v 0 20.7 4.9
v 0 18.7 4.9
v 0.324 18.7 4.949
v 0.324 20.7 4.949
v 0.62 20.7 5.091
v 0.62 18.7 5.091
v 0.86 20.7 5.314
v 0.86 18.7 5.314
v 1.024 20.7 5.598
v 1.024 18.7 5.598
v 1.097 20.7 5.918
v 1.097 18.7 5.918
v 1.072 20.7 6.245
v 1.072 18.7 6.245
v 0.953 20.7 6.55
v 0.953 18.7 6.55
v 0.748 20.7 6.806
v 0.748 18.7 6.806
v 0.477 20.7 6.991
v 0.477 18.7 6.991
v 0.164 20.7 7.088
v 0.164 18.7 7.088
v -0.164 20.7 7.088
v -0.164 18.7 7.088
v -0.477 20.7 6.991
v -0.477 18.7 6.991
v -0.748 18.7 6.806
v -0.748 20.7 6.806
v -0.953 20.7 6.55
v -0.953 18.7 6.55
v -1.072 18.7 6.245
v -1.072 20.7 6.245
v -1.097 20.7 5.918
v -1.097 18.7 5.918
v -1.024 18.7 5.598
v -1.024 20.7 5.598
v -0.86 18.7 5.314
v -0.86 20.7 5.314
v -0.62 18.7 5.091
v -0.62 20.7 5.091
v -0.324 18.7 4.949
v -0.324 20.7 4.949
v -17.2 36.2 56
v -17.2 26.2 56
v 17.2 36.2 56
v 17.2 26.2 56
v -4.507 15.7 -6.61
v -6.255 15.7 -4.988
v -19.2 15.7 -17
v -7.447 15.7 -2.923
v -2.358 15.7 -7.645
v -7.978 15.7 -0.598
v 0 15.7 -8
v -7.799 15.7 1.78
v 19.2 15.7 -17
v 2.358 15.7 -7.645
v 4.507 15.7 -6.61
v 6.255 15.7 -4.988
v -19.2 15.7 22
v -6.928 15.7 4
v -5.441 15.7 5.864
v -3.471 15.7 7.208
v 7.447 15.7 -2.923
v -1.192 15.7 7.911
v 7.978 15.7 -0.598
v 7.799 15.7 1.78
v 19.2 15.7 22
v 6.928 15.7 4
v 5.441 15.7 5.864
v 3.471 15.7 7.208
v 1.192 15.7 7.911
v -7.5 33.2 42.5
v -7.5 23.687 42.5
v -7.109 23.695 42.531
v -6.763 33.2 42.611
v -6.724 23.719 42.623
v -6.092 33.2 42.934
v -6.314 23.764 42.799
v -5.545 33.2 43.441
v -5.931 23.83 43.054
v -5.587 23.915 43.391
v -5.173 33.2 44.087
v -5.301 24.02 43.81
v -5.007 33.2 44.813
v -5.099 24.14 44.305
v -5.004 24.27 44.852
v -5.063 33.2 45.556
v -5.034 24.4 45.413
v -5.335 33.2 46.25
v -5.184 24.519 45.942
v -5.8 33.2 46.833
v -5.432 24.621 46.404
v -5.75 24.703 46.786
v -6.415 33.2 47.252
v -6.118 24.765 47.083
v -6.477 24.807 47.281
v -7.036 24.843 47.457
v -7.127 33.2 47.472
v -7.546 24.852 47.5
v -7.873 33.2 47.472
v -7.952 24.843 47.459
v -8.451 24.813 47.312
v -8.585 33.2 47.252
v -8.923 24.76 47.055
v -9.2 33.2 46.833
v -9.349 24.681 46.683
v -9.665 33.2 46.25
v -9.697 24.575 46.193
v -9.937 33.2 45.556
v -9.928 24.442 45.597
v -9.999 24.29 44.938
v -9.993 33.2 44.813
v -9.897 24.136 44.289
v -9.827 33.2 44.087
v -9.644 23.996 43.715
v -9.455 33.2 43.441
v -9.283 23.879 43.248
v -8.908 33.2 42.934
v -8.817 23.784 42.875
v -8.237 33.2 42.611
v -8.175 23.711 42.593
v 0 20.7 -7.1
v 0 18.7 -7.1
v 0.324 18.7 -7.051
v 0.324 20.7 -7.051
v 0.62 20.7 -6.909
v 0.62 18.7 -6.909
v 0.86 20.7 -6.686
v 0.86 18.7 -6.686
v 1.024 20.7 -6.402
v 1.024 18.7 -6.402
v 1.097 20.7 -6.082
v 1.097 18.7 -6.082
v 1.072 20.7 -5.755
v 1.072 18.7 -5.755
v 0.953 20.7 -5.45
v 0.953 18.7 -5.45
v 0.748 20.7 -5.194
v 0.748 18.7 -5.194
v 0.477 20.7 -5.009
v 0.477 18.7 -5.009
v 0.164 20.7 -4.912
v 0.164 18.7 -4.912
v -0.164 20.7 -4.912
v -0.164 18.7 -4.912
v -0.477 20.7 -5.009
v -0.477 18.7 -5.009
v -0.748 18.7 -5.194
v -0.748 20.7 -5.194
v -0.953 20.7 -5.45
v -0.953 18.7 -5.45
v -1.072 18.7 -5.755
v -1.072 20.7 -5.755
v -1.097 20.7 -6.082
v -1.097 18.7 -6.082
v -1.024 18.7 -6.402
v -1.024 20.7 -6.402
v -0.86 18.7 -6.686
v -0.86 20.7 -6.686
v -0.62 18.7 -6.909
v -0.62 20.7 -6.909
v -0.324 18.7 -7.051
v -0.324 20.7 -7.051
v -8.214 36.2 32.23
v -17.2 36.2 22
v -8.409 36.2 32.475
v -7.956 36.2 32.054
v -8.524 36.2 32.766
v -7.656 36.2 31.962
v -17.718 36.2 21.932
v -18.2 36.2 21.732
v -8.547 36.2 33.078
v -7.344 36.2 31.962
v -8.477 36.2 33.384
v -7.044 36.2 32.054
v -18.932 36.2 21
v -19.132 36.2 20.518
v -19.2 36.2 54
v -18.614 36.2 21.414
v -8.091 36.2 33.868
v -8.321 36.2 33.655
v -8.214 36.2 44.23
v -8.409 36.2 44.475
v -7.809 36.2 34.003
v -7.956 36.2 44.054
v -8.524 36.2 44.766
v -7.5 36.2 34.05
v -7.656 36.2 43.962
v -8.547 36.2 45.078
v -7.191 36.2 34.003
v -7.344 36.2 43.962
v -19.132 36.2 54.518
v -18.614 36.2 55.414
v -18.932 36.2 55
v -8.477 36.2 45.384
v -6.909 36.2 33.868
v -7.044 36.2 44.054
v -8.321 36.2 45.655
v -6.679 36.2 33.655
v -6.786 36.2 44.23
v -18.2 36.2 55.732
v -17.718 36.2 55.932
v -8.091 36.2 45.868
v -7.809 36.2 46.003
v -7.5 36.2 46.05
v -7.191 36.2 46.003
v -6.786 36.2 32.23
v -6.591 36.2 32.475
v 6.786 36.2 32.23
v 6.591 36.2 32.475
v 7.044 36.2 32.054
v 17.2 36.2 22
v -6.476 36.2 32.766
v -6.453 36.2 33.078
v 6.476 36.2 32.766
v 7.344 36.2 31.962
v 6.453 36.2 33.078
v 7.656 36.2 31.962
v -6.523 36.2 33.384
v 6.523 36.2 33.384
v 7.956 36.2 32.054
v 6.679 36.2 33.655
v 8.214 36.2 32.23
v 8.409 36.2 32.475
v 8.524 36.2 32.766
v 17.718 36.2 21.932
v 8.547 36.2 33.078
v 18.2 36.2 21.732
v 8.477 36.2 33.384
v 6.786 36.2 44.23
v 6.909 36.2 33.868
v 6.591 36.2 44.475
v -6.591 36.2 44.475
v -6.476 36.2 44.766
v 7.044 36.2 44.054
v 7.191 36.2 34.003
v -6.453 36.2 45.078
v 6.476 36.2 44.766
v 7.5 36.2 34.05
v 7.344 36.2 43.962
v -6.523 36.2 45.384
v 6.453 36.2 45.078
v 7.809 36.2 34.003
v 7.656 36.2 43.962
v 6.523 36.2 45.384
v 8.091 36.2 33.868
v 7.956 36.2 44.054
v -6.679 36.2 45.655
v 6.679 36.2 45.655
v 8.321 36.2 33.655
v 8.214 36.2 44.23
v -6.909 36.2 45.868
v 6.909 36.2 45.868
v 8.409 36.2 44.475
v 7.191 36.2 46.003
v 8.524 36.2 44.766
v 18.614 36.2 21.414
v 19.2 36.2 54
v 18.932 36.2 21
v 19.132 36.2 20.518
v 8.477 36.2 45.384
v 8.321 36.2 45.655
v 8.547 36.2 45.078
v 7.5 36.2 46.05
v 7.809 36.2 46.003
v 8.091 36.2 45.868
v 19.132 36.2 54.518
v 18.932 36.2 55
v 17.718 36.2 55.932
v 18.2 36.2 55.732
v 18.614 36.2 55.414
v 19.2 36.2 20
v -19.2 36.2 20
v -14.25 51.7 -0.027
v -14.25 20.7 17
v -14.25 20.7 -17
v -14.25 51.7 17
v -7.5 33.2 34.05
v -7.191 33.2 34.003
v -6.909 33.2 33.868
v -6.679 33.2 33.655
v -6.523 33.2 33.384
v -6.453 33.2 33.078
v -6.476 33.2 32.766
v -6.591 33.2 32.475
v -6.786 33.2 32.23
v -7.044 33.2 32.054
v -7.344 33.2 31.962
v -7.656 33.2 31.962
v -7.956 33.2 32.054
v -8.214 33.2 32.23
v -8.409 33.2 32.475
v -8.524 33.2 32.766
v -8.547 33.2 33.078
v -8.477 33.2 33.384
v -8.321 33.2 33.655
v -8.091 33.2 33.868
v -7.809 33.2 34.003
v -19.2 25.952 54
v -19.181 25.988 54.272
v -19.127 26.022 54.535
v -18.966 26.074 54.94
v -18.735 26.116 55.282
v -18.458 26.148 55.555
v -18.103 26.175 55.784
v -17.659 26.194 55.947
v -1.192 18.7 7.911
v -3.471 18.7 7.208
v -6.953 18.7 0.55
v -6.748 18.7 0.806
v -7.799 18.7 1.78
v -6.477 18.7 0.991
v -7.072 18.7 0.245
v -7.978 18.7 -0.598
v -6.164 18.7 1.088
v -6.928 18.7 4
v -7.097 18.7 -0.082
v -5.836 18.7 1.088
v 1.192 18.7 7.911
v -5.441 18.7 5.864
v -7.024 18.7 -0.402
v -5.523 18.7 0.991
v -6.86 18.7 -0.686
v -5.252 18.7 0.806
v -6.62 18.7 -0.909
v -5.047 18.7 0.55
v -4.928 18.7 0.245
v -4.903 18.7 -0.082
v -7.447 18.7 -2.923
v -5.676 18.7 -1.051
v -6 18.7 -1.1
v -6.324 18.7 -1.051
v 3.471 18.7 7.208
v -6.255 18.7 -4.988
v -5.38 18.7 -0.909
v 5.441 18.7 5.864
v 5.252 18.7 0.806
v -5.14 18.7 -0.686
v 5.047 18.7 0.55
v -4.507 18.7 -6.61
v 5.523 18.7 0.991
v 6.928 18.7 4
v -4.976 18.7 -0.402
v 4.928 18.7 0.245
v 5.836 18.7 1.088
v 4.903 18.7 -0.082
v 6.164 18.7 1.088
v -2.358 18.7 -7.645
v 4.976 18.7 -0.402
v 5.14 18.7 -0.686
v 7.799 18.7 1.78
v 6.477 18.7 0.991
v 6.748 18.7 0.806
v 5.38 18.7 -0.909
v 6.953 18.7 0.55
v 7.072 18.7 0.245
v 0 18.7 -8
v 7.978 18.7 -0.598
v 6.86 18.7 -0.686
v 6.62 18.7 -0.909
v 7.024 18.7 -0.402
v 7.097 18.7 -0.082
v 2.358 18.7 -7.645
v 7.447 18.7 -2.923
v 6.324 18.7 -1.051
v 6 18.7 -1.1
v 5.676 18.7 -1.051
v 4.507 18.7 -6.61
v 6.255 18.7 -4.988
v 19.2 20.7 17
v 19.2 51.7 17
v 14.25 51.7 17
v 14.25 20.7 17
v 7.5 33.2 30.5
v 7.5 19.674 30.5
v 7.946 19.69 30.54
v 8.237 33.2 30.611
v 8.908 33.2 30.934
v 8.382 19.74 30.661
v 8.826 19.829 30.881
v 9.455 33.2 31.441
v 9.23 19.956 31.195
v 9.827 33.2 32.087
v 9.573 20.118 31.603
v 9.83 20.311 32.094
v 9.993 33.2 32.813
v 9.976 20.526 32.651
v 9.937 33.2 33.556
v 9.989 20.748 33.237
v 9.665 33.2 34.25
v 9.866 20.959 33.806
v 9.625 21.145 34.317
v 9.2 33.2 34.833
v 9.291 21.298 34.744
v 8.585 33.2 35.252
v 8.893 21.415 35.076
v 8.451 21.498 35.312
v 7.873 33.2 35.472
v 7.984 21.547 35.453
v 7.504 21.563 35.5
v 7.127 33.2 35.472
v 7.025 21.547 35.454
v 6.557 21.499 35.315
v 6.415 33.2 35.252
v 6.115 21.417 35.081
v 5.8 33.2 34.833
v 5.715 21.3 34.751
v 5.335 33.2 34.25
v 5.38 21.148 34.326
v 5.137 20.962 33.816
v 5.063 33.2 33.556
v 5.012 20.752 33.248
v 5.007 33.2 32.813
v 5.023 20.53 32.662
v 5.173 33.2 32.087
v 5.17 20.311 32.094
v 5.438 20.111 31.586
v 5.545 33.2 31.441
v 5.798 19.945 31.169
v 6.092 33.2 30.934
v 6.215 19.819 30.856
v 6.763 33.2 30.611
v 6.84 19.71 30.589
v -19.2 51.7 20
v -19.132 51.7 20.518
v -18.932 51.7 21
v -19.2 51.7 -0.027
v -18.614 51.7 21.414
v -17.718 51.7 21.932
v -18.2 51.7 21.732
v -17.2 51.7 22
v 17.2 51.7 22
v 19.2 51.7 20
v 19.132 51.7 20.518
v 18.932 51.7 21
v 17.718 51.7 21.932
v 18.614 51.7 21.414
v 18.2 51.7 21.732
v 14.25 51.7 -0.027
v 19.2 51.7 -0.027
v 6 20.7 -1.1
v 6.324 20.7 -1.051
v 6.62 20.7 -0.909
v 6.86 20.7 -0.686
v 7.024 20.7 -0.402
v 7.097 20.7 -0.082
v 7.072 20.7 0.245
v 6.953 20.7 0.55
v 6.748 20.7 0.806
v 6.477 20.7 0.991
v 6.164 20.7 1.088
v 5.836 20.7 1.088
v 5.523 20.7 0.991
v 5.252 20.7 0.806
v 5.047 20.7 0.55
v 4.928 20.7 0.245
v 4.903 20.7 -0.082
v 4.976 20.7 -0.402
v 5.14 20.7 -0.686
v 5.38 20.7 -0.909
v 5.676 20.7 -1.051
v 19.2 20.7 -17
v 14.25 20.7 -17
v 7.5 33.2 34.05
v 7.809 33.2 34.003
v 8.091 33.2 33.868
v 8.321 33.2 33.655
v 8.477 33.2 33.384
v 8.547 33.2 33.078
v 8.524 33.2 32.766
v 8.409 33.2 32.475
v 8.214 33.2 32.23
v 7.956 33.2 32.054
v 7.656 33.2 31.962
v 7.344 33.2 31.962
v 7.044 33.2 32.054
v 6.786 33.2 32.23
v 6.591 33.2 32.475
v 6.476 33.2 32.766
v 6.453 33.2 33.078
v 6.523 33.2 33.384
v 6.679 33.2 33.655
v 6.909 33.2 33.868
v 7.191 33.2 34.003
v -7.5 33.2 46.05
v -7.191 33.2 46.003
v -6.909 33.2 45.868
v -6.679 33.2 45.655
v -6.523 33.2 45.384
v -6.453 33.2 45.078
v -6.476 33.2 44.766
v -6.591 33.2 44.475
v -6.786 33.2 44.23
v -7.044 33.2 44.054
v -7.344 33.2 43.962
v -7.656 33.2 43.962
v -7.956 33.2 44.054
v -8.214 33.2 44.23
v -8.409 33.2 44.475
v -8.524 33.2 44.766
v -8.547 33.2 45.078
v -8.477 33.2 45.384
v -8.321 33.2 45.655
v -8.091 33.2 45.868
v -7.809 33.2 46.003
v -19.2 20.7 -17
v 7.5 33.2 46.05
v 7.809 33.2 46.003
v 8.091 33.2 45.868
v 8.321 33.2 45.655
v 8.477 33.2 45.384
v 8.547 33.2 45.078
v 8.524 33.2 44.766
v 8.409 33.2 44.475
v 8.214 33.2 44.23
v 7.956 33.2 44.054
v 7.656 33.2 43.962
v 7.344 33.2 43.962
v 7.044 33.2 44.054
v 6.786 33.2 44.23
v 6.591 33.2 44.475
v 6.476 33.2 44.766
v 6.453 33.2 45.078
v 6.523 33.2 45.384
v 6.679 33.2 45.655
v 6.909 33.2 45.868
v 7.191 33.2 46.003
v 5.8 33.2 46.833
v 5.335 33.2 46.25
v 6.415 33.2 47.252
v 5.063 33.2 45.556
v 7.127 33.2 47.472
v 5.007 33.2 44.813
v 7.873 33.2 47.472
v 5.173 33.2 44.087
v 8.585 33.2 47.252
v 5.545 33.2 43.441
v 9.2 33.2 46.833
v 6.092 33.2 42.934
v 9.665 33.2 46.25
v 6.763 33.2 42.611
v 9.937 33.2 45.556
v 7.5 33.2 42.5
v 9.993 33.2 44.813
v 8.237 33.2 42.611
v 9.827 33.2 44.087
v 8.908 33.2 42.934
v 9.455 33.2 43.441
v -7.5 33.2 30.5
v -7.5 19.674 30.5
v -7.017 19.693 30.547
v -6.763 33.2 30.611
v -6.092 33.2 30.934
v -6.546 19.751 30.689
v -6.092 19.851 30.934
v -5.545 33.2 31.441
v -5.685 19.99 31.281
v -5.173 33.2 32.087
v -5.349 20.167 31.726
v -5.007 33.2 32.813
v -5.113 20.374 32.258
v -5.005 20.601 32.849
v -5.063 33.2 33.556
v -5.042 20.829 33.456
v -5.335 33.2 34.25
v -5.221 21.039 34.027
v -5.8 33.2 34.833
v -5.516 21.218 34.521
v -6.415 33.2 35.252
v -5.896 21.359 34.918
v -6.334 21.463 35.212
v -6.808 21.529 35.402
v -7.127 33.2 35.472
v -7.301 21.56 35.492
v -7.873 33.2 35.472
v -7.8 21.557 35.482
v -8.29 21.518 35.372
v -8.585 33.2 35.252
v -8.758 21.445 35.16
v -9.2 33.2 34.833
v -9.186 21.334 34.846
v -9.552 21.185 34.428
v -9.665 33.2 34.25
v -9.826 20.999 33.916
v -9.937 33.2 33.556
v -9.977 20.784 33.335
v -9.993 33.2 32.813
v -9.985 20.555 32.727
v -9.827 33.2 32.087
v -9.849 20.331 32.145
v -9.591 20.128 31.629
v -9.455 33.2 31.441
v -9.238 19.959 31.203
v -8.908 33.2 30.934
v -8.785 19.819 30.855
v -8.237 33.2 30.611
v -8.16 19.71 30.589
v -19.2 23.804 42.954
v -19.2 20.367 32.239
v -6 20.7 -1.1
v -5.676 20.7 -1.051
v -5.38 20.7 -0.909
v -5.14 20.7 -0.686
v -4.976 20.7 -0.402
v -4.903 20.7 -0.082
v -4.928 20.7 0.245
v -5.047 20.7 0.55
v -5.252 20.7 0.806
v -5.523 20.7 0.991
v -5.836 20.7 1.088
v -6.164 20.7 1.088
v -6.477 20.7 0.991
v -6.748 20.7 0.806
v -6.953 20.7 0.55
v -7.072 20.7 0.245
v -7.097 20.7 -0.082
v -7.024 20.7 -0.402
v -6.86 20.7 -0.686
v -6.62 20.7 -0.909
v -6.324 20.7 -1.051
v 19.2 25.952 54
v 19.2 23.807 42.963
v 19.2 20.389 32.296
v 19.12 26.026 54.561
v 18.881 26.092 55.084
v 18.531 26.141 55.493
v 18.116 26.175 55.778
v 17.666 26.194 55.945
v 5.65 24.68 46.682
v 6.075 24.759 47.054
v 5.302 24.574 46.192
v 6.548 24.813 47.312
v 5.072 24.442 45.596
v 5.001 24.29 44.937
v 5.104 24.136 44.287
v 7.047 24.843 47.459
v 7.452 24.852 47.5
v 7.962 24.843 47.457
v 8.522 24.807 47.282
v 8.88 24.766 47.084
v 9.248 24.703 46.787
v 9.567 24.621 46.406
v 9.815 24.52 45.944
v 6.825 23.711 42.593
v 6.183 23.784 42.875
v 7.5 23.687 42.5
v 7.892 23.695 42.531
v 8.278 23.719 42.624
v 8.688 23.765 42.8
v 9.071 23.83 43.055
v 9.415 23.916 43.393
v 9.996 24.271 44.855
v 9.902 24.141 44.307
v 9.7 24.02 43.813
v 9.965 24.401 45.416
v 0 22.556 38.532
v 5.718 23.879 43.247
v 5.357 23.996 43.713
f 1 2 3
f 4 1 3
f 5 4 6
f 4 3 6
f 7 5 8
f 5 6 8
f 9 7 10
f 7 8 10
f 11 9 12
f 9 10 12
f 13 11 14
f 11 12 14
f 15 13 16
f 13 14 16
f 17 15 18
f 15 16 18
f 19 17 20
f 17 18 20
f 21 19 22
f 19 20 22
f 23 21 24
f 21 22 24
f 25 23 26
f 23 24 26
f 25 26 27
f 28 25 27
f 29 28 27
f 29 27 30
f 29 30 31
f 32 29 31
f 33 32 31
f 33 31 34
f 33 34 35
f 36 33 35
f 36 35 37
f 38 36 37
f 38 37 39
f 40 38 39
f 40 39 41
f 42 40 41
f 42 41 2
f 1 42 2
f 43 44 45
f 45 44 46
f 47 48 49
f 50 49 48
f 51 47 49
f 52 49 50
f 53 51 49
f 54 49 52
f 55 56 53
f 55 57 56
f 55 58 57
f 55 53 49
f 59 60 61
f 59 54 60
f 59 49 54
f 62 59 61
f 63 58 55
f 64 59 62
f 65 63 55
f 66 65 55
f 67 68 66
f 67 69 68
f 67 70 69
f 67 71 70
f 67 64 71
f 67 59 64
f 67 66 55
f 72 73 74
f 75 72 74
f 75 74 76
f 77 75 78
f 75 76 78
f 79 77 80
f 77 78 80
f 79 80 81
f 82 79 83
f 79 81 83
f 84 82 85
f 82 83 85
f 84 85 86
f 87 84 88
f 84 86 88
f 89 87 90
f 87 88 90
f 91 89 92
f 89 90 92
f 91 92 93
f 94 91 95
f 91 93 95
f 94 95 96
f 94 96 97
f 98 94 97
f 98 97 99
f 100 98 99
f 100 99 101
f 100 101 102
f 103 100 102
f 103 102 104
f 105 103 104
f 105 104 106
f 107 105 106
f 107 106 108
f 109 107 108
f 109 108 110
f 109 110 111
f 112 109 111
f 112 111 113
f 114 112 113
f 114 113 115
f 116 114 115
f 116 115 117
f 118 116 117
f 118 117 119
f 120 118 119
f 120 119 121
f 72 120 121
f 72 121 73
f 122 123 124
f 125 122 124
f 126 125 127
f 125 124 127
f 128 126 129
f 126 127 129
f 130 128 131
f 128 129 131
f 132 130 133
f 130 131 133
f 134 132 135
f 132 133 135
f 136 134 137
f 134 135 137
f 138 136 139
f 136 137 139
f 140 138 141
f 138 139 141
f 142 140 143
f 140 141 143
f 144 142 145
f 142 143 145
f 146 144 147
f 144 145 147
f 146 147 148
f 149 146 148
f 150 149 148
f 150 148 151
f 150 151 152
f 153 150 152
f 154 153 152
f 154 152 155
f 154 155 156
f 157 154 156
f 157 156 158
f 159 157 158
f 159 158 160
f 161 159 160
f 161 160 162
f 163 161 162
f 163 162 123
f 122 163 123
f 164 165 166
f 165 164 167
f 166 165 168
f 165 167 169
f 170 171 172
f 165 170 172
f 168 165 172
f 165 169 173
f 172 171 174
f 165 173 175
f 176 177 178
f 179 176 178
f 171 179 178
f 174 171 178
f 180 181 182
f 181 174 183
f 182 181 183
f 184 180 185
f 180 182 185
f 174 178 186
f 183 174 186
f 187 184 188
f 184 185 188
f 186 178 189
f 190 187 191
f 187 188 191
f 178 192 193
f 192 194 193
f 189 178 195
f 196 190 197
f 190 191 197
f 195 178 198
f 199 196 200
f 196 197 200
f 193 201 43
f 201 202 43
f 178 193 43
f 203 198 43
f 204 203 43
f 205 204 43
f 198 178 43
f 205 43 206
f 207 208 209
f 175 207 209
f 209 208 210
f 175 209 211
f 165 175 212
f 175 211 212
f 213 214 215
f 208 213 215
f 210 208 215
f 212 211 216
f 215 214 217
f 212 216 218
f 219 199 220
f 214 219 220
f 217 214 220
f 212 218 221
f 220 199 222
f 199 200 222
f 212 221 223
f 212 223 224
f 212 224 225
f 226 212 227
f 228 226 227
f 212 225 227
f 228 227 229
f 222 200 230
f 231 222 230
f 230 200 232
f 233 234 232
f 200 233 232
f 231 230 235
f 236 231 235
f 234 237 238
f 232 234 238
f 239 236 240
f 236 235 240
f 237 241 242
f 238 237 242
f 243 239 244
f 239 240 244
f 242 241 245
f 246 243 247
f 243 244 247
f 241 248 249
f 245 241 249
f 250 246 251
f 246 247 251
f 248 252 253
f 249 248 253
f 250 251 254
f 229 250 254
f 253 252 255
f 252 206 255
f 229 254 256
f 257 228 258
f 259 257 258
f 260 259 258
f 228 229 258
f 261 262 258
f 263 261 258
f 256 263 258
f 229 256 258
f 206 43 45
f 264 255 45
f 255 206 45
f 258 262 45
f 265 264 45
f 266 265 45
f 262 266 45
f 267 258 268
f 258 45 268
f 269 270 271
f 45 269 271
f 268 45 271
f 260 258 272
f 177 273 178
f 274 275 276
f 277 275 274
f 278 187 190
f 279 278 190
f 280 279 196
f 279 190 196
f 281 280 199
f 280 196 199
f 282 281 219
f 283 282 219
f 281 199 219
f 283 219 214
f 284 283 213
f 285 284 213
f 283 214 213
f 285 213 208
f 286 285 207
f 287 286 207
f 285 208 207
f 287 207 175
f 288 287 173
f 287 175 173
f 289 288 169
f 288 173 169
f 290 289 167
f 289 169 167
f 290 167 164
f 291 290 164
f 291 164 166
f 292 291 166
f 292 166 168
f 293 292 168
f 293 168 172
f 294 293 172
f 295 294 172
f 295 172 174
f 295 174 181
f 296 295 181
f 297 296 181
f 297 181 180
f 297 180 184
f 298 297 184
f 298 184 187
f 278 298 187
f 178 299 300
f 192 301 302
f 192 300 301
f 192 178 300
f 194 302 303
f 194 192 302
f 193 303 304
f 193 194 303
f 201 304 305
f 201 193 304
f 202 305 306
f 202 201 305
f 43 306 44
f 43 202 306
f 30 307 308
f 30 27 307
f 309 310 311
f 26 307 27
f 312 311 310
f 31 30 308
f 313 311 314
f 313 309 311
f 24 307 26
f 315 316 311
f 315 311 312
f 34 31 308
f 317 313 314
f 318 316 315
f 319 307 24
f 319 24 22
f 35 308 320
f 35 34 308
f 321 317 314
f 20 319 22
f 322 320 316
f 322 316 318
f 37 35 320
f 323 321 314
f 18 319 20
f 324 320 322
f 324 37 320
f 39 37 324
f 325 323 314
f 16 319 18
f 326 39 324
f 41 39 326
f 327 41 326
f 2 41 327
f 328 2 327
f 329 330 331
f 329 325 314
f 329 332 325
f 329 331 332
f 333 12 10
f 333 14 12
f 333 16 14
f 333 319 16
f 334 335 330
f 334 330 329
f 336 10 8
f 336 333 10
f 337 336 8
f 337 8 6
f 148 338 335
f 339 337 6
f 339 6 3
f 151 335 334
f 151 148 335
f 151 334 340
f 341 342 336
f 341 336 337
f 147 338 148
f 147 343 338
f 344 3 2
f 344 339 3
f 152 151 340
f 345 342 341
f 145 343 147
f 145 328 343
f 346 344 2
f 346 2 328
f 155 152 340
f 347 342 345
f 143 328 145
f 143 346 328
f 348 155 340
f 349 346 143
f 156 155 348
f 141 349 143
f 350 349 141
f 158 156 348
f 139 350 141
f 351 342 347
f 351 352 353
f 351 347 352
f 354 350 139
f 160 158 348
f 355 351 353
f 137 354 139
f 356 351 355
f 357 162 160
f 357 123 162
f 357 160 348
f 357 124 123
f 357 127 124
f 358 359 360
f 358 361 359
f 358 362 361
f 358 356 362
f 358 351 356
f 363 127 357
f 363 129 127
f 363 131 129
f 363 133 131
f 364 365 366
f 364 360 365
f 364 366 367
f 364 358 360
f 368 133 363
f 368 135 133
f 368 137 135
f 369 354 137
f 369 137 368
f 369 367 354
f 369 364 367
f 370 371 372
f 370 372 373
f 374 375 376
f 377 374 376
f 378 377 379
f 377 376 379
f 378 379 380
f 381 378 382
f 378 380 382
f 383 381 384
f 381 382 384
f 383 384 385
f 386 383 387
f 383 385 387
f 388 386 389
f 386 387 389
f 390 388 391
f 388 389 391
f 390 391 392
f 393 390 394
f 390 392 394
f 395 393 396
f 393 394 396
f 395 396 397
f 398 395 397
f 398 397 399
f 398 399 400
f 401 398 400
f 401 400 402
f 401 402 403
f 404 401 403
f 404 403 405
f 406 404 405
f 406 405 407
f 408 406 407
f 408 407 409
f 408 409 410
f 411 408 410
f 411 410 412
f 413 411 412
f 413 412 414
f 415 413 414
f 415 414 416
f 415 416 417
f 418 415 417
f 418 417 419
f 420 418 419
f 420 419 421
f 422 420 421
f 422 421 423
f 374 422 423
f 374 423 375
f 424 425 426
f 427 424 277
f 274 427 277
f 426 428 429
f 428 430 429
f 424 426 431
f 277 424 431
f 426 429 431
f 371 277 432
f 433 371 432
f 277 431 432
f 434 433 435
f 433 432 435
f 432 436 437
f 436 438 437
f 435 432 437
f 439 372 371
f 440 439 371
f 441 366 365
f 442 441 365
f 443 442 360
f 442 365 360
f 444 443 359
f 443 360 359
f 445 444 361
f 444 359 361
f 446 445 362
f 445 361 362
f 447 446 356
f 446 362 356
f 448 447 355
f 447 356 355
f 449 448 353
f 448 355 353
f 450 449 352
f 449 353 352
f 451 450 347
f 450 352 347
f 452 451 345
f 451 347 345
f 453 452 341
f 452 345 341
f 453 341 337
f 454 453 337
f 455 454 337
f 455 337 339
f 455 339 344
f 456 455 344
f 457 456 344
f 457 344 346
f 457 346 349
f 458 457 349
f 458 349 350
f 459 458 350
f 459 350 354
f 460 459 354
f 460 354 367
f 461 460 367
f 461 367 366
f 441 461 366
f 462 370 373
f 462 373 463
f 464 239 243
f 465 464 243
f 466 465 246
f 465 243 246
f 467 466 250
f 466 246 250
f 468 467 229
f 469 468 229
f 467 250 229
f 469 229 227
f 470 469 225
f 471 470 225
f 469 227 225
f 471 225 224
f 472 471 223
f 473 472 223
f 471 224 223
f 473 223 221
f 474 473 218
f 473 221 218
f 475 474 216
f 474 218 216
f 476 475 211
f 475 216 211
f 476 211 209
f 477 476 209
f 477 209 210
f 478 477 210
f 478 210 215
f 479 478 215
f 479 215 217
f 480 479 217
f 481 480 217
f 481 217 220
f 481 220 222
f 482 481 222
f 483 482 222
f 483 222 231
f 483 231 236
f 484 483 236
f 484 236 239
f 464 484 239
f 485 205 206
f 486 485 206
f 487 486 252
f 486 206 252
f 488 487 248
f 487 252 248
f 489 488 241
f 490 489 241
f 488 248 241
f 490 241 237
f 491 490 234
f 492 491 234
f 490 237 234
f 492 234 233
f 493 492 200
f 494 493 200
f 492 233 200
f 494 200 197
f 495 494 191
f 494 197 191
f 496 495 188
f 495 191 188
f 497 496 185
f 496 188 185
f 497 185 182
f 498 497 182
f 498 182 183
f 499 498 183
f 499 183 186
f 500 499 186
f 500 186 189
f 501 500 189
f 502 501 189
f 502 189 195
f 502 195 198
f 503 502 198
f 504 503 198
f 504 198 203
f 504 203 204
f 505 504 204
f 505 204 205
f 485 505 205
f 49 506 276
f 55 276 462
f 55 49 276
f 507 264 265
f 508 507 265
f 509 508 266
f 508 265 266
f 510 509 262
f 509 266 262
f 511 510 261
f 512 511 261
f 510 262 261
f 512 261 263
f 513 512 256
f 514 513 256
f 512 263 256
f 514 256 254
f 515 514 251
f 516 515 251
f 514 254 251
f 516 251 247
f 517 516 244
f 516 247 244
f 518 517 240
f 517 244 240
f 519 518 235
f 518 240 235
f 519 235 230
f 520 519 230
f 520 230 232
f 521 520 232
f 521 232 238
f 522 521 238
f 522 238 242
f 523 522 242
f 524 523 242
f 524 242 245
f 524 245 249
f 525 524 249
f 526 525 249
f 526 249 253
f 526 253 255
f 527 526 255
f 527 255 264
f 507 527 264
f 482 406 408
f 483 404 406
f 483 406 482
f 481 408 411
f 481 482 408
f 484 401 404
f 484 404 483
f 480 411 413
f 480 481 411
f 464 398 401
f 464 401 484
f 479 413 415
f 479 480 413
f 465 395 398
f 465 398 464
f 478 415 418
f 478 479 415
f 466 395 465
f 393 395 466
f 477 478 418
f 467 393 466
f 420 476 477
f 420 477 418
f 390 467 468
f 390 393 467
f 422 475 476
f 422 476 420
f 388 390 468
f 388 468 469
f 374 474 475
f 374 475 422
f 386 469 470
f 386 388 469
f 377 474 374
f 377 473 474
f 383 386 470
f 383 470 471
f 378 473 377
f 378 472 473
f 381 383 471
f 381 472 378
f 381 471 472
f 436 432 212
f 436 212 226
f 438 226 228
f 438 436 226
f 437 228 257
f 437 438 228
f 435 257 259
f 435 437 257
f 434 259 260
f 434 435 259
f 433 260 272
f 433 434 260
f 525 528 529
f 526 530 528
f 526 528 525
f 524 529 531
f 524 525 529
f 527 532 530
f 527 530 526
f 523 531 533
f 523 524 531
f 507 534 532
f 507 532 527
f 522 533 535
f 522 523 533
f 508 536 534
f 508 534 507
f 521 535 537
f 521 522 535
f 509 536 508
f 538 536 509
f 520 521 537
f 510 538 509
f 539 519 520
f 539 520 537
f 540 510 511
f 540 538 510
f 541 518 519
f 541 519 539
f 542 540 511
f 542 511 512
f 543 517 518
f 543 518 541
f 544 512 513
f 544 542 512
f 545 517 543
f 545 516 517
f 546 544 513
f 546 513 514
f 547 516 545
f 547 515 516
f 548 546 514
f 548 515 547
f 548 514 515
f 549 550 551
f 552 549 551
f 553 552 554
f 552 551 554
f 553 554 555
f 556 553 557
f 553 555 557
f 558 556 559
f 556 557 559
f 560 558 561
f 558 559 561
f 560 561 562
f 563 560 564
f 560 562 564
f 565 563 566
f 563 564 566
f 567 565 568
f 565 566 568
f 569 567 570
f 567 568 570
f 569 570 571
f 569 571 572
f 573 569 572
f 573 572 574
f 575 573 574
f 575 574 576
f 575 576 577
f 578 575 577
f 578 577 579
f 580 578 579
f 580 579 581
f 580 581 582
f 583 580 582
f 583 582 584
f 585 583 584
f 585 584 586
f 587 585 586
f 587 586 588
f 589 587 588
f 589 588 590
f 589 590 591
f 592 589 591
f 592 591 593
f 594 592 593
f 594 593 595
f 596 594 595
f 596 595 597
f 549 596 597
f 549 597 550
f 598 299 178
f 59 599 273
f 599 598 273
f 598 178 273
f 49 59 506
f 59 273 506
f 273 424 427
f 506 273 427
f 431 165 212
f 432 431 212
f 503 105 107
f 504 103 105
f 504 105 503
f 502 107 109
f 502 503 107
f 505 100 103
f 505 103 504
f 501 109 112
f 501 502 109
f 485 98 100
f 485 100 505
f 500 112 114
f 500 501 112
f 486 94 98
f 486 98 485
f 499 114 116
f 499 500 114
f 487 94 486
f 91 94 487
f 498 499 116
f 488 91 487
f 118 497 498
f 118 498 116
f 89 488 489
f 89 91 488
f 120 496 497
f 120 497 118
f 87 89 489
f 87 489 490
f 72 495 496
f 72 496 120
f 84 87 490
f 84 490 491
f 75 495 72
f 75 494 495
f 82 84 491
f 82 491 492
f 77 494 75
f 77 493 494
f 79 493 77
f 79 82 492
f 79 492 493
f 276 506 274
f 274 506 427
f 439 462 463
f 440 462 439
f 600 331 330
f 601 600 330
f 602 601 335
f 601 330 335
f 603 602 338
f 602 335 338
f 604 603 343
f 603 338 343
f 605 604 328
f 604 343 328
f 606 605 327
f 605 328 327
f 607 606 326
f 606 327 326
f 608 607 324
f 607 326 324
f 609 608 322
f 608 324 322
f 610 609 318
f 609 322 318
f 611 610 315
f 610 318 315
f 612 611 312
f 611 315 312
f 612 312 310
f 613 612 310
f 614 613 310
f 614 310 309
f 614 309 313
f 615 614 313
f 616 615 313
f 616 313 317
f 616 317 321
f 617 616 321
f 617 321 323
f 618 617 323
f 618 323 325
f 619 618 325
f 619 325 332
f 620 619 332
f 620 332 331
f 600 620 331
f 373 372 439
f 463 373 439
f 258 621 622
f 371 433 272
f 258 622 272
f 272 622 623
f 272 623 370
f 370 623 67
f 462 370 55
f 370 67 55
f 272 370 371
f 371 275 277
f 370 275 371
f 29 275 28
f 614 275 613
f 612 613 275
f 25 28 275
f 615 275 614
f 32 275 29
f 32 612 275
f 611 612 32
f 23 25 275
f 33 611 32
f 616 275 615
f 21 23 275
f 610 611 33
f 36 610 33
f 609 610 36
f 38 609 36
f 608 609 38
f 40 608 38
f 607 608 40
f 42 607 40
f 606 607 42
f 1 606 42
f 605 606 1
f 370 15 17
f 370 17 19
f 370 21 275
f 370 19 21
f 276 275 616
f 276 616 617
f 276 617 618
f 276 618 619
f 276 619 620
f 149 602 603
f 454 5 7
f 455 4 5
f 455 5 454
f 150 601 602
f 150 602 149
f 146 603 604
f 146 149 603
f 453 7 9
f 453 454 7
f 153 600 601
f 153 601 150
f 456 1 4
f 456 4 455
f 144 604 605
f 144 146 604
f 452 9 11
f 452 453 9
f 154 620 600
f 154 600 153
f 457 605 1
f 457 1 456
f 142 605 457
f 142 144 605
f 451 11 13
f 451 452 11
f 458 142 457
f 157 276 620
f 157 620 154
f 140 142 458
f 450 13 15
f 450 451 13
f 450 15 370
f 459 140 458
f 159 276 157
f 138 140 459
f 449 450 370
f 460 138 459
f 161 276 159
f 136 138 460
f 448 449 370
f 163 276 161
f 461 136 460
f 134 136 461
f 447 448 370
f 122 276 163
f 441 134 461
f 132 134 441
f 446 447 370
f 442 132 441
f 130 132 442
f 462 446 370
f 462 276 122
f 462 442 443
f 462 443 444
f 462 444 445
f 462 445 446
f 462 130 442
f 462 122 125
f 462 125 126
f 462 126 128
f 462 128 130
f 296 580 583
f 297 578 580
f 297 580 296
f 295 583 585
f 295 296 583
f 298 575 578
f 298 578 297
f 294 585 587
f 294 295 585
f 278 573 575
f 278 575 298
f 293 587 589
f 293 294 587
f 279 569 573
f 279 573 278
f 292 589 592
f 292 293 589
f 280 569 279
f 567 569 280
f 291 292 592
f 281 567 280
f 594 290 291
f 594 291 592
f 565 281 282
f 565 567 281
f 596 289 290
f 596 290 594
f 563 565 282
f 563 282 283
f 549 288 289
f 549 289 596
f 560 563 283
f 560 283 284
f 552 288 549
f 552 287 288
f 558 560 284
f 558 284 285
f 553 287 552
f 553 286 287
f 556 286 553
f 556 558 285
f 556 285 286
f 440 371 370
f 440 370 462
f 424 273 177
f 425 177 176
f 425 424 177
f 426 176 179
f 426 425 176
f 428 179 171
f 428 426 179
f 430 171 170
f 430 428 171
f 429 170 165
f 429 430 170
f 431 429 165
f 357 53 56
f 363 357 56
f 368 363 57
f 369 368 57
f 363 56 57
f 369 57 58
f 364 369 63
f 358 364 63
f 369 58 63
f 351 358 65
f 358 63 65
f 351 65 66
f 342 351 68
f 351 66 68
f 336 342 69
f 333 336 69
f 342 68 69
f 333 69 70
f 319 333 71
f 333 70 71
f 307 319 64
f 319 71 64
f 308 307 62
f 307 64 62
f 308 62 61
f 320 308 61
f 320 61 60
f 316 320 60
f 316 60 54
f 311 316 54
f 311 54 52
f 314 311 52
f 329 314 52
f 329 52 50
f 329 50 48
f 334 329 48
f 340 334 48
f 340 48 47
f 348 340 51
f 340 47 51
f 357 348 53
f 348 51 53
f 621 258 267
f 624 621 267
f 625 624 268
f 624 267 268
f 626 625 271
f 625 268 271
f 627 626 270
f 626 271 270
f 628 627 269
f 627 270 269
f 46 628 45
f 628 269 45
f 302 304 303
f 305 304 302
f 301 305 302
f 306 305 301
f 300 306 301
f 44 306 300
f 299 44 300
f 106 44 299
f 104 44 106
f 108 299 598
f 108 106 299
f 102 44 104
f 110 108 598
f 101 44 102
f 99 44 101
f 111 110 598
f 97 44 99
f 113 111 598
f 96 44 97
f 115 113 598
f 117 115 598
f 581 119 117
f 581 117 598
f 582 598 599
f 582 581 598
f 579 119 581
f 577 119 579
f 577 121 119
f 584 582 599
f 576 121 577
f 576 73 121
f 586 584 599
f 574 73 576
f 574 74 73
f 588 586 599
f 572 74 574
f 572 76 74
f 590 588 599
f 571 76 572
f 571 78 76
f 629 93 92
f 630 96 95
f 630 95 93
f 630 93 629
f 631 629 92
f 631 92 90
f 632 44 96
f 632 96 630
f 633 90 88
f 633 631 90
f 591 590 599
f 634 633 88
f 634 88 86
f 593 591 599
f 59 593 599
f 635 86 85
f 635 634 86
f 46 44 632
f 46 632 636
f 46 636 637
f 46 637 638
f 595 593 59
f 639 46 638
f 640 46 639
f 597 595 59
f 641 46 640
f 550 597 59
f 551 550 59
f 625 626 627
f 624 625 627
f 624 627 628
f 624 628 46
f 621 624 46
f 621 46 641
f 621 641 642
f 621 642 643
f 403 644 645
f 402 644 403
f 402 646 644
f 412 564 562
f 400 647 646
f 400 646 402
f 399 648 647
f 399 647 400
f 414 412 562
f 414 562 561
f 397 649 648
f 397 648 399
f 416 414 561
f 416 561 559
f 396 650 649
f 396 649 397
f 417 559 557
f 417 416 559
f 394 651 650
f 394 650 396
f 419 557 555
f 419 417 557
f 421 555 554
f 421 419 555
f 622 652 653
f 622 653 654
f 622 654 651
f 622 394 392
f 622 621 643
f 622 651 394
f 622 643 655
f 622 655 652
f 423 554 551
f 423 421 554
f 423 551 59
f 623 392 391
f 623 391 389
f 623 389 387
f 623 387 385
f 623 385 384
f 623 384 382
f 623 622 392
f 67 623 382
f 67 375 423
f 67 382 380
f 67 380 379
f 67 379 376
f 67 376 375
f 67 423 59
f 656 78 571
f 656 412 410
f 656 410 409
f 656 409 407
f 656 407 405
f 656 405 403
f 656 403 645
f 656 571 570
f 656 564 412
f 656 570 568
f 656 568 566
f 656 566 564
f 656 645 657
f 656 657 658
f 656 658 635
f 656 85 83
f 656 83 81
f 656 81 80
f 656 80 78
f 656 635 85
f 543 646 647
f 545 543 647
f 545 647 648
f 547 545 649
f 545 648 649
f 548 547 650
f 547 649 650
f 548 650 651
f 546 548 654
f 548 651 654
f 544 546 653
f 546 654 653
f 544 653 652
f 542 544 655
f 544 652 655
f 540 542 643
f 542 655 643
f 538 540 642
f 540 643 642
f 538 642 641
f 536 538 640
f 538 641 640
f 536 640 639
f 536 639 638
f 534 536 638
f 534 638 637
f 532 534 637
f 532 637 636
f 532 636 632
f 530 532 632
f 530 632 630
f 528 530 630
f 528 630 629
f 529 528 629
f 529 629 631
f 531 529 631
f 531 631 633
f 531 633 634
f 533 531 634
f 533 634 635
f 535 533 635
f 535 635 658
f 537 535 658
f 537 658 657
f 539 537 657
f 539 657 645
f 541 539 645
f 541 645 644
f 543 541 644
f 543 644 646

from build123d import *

# Parameters (mm, degrees)
SKETCH1_R           = 9.6
BOSS_EXTRUDE1_DEPTH = 15.7
SKETCH3_W           = 38.4
SKETCH3_H           = 34
BOSS_EXTRUDE2_DEPTH = 5
SKETCH2_R           = 1.1
CUT_EXTRUDE1_DEPTH  = 33.956486463
SKETCH7_W           = 38.4
SKETCH7_H           = 39
BOSS_EXTRUDE3_DEPTH = 20.5
SKETCH11_W          = 38.4
SKETCH11_H          = 5
BOSS_EXTRUDE7_DEPTH = 46.6
BOSS_EXTRUDE8_DEPTH = 4.95
BOSS_EXTRUDE9_DEPTH = 4.95
FILLET2_R           = 2
CUT_EXTRUDE5_DEPTH  = 108.081277542
SKETCH16_W          = 7
SKETCH16_H          = 13.8
CUT_EXTRUDE9_DEPTH  = 94.517271406
SKETCH18_R          = 1.05
CUT_EXTRUDE10_DEPTH = 76.34056044
SKETCH19_R          = 2.5
CUT_EXTRUDE11_DEPTH = 27.5
SKETCH20_W          = 39
SKETCH20_H          = 17.86072518
CUT_EXTRUDE12_DEPTH = 108.081277707
SKETCH21_R          = 8
CUT_EXTRUDE13_DEPTH = 3
FILLET3_R           = 2
SKETCH22_W          = 38.4
SKETCH22_H          = 31.1
CUT_EXTRUDE14_DEPTH = 94.517271406


with BuildPart() as part:
    # Sketch1 → Boss-Extrude1 (new body)
    with BuildSketch(Plane(origin=(0, 0, 0), x_dir=(1, 0, 0), z_dir=(0, 1, 0))):
        with Locations(Location((0, 0, 0), (0, 0, 270))):
            Circle(SKETCH1_R)
    extrude(amount=BOSS_EXTRUDE1_DEPTH)

    # Sketch3 → Boss-Extrude2 (add)
    with BuildSketch(Plane(origin=(0, 15.7, 0), x_dir=(1, 0, 0), z_dir=(0, 1, 0))):
        Rectangle(SKETCH3_W, SKETCH3_H)
    extrude(amount=BOSS_EXTRUDE2_DEPTH)

    # Sketch2 → Cut-Extrude1 (cut, through all)
    with BuildSketch(Plane(origin=(0, 0, 0), x_dir=(-1, 0, 0), z_dir=(0, -1, 0))):
        with Locations(Location((0, -6, 0), (0, 0, 90))):
            Circle(SKETCH2_R)
        with Locations(Location((0, 6, 0), (0, 0, 90))):
            Circle(SKETCH2_R)
        with Locations(Location((-6, 0, 0), (0, 0, 90))):
            Circle(SKETCH2_R)
        with Locations(Location((6, 0, 0), (0, 0, 90))):
            Circle(SKETCH2_R)
    extrude(amount=-CUT_EXTRUDE1_DEPTH, mode=Mode.SUBTRACT)

    # Sketch7 → Boss-Extrude3 (add)
    with BuildSketch(Plane.XZ.offset(-15.7)):
        with Locations((0, 36.5)):
            Rectangle(SKETCH7_W, SKETCH7_H)
    extrude(amount=-BOSS_EXTRUDE3_DEPTH)

    # Sketch11 → Boss-Extrude7 (add)
    with BuildSketch(Plane(origin=(0, 36.2, 0), x_dir=(1, 0, 0), z_dir=(0, 1, 0))):
        with Locations((0, -19.5)):
            Rectangle(SKETCH11_W, SKETCH11_H)
    extrude(amount=BOSS_EXTRUDE7_DEPTH)

    # Sketch13 → Boss-Extrude9 (add)
    with BuildSketch(Plane.ZY.offset(19.2)):
        Polygon((17, 82.8), (17, 20.7), (-17, 20.7), align=None)
    extrude(amount=-BOSS_EXTRUDE9_DEPTH)

    # Fillet2
    fillet2_edges = [part.edges().sort_by_distance(p)[0] for p in [
        (-19.2, 25.95, 56),
        (19.2, 25.95, 56),
    ]]
    fillet(fillet2_edges, radius=FILLET2_R)

    # Sketch15 → Cut-Extrude5 (cut, through all)
    with BuildSketch(Plane(origin=(19.2, 0, 0), x_dir=(0, 0, -1), z_dir=(1, 0, 0))):
        with BuildLine():
            Line((-56, 26.2), (-56, 15.7))
            Line((-56, 15.7), (-22, 15.7))
            add(Edge.make_bspline(
                [(-56, 26.2), (-38.064806405, 24.161238531), (-22, 15.7)],
                knots=[0, 0, 0, 1, 1, 1], degree=2))
        make_face()
    extrude(amount=-CUT_EXTRUDE5_DEPTH, mode=Mode.SUBTRACT)

    # Sketch16 → Cut-Extrude9 (cut, through all)
    with BuildSketch(Plane.XY.offset(22)):
        with Locations((-10.75, 58.6)):
            Rectangle(SKETCH16_W, SKETCH16_H)
        with Locations((10.75, 58.6)):
            Rectangle(SKETCH16_W, SKETCH16_H)
    extrude(amount=-CUT_EXTRUDE9_DEPTH, mode=Mode.SUBTRACT)

    # Sketch18 → Cut-Extrude10 (cut, through all)
    with BuildSketch(Plane(origin=(0, 36.2, 0), x_dir=(1, 0, 0), z_dir=(0, 1, 0))):
        with Locations(Location((-7.5, -33, 0), (0, 0, 270))):
            Circle(SKETCH18_R)
        with Locations(Location((-7.5, -45, 0), (0, 0, 270))):
            Circle(SKETCH18_R)
        with Locations(Location((7.5, -33, 0), (0, 0, 270))):
            Circle(SKETCH18_R)
        with Locations(Location((7.5, -45, 0), (0, 0, 270))):
            Circle(SKETCH18_R)
    extrude(amount=-CUT_EXTRUDE10_DEPTH, mode=Mode.SUBTRACT)

    # Sketch19 → Cut-Extrude11 (cut)
    with BuildSketch(Plane(origin=(0, 5.7, 0), x_dir=(-1, 0, 0), z_dir=(0, -1, 0))):
        with Locations(Location((-7.5, -33, 0), (0, 0, 90))):
            Circle(SKETCH19_R)
        with Locations(Location((7.5, -33, 0), (0, 0, 90))):
            Circle(SKETCH19_R)
        with Locations(Location((-7.5, -45, 0), (0, 0, 90))):
            Circle(SKETCH19_R)
        with Locations(Location((7.5, -45, 0), (0, 0, 90))):
            Circle(SKETCH19_R)
    extrude(amount=-CUT_EXTRUDE11_DEPTH, mode=Mode.SUBTRACT)

    # Sketch20 → Cut-Extrude12 (cut, through all)
    with BuildSketch(Plane(origin=(19.2, 0, 0), x_dir=(0, 0, -1), z_dir=(1, 0, 0))):
        with Locations((-2.5, 6.76963741)):
            Rectangle(SKETCH20_W, SKETCH20_H)
    extrude(amount=-CUT_EXTRUDE12_DEPTH, mode=Mode.SUBTRACT)

    # Sketch21 → Cut-Extrude13 (cut)
    with BuildSketch(Plane.XZ.offset(-15.7)):
        with Locations(Location((0, 0, 0), (0, 0, 270))):
            Circle(SKETCH21_R)
    extrude(amount=-CUT_EXTRUDE13_DEPTH, mode=Mode.SUBTRACT)

    # Fillet3
    fillet3_edges = [part.edges().sort_by_distance(p)[0] for p in [
        (-19.2, 59.5, 22),
        (19.2, 59.5, 22),
    ]]
    fillet(fillet3_edges, radius=FILLET3_R)


with BuildPart() as body_2:
    # Sketch12 → Boss-Extrude8 (new body)
    with BuildSketch(Plane(origin=(19.2, 0, 0), x_dir=(0, 0, -1), z_dir=(1, 0, 0))):
        Polygon((-17, 82.8), (-17, 20.7), (17, 20.7), align=None)
    extrude(amount=-BOSS_EXTRUDE8_DEPTH)


with BuildPart() as cut_extrude14_tool:
    # Sketch22 → Cut-Extrude14 (new, through all)
    with BuildSketch(Plane.XY.offset(22)):
        with Locations((0, 67.25)):
            Rectangle(SKETCH22_W, SKETCH22_H)
    extrude(amount=-CUT_EXTRUDE14_DEPTH)


with BuildPart() as part_1:
    add(part.part)

    # Cut-Extrude14: cut by cut_extrude14_tool
    add(cut_extrude14_tool.part, mode=Mode.SUBTRACT)


with BuildPart() as body_2_1:
    add(body_2.part)

    # Cut-Extrude14: cut by cut_extrude14_tool
    add(cut_extrude14_tool.part, mode=Mode.SUBTRACT)


solid = Compound([part_1.part, body_2_1.part])
